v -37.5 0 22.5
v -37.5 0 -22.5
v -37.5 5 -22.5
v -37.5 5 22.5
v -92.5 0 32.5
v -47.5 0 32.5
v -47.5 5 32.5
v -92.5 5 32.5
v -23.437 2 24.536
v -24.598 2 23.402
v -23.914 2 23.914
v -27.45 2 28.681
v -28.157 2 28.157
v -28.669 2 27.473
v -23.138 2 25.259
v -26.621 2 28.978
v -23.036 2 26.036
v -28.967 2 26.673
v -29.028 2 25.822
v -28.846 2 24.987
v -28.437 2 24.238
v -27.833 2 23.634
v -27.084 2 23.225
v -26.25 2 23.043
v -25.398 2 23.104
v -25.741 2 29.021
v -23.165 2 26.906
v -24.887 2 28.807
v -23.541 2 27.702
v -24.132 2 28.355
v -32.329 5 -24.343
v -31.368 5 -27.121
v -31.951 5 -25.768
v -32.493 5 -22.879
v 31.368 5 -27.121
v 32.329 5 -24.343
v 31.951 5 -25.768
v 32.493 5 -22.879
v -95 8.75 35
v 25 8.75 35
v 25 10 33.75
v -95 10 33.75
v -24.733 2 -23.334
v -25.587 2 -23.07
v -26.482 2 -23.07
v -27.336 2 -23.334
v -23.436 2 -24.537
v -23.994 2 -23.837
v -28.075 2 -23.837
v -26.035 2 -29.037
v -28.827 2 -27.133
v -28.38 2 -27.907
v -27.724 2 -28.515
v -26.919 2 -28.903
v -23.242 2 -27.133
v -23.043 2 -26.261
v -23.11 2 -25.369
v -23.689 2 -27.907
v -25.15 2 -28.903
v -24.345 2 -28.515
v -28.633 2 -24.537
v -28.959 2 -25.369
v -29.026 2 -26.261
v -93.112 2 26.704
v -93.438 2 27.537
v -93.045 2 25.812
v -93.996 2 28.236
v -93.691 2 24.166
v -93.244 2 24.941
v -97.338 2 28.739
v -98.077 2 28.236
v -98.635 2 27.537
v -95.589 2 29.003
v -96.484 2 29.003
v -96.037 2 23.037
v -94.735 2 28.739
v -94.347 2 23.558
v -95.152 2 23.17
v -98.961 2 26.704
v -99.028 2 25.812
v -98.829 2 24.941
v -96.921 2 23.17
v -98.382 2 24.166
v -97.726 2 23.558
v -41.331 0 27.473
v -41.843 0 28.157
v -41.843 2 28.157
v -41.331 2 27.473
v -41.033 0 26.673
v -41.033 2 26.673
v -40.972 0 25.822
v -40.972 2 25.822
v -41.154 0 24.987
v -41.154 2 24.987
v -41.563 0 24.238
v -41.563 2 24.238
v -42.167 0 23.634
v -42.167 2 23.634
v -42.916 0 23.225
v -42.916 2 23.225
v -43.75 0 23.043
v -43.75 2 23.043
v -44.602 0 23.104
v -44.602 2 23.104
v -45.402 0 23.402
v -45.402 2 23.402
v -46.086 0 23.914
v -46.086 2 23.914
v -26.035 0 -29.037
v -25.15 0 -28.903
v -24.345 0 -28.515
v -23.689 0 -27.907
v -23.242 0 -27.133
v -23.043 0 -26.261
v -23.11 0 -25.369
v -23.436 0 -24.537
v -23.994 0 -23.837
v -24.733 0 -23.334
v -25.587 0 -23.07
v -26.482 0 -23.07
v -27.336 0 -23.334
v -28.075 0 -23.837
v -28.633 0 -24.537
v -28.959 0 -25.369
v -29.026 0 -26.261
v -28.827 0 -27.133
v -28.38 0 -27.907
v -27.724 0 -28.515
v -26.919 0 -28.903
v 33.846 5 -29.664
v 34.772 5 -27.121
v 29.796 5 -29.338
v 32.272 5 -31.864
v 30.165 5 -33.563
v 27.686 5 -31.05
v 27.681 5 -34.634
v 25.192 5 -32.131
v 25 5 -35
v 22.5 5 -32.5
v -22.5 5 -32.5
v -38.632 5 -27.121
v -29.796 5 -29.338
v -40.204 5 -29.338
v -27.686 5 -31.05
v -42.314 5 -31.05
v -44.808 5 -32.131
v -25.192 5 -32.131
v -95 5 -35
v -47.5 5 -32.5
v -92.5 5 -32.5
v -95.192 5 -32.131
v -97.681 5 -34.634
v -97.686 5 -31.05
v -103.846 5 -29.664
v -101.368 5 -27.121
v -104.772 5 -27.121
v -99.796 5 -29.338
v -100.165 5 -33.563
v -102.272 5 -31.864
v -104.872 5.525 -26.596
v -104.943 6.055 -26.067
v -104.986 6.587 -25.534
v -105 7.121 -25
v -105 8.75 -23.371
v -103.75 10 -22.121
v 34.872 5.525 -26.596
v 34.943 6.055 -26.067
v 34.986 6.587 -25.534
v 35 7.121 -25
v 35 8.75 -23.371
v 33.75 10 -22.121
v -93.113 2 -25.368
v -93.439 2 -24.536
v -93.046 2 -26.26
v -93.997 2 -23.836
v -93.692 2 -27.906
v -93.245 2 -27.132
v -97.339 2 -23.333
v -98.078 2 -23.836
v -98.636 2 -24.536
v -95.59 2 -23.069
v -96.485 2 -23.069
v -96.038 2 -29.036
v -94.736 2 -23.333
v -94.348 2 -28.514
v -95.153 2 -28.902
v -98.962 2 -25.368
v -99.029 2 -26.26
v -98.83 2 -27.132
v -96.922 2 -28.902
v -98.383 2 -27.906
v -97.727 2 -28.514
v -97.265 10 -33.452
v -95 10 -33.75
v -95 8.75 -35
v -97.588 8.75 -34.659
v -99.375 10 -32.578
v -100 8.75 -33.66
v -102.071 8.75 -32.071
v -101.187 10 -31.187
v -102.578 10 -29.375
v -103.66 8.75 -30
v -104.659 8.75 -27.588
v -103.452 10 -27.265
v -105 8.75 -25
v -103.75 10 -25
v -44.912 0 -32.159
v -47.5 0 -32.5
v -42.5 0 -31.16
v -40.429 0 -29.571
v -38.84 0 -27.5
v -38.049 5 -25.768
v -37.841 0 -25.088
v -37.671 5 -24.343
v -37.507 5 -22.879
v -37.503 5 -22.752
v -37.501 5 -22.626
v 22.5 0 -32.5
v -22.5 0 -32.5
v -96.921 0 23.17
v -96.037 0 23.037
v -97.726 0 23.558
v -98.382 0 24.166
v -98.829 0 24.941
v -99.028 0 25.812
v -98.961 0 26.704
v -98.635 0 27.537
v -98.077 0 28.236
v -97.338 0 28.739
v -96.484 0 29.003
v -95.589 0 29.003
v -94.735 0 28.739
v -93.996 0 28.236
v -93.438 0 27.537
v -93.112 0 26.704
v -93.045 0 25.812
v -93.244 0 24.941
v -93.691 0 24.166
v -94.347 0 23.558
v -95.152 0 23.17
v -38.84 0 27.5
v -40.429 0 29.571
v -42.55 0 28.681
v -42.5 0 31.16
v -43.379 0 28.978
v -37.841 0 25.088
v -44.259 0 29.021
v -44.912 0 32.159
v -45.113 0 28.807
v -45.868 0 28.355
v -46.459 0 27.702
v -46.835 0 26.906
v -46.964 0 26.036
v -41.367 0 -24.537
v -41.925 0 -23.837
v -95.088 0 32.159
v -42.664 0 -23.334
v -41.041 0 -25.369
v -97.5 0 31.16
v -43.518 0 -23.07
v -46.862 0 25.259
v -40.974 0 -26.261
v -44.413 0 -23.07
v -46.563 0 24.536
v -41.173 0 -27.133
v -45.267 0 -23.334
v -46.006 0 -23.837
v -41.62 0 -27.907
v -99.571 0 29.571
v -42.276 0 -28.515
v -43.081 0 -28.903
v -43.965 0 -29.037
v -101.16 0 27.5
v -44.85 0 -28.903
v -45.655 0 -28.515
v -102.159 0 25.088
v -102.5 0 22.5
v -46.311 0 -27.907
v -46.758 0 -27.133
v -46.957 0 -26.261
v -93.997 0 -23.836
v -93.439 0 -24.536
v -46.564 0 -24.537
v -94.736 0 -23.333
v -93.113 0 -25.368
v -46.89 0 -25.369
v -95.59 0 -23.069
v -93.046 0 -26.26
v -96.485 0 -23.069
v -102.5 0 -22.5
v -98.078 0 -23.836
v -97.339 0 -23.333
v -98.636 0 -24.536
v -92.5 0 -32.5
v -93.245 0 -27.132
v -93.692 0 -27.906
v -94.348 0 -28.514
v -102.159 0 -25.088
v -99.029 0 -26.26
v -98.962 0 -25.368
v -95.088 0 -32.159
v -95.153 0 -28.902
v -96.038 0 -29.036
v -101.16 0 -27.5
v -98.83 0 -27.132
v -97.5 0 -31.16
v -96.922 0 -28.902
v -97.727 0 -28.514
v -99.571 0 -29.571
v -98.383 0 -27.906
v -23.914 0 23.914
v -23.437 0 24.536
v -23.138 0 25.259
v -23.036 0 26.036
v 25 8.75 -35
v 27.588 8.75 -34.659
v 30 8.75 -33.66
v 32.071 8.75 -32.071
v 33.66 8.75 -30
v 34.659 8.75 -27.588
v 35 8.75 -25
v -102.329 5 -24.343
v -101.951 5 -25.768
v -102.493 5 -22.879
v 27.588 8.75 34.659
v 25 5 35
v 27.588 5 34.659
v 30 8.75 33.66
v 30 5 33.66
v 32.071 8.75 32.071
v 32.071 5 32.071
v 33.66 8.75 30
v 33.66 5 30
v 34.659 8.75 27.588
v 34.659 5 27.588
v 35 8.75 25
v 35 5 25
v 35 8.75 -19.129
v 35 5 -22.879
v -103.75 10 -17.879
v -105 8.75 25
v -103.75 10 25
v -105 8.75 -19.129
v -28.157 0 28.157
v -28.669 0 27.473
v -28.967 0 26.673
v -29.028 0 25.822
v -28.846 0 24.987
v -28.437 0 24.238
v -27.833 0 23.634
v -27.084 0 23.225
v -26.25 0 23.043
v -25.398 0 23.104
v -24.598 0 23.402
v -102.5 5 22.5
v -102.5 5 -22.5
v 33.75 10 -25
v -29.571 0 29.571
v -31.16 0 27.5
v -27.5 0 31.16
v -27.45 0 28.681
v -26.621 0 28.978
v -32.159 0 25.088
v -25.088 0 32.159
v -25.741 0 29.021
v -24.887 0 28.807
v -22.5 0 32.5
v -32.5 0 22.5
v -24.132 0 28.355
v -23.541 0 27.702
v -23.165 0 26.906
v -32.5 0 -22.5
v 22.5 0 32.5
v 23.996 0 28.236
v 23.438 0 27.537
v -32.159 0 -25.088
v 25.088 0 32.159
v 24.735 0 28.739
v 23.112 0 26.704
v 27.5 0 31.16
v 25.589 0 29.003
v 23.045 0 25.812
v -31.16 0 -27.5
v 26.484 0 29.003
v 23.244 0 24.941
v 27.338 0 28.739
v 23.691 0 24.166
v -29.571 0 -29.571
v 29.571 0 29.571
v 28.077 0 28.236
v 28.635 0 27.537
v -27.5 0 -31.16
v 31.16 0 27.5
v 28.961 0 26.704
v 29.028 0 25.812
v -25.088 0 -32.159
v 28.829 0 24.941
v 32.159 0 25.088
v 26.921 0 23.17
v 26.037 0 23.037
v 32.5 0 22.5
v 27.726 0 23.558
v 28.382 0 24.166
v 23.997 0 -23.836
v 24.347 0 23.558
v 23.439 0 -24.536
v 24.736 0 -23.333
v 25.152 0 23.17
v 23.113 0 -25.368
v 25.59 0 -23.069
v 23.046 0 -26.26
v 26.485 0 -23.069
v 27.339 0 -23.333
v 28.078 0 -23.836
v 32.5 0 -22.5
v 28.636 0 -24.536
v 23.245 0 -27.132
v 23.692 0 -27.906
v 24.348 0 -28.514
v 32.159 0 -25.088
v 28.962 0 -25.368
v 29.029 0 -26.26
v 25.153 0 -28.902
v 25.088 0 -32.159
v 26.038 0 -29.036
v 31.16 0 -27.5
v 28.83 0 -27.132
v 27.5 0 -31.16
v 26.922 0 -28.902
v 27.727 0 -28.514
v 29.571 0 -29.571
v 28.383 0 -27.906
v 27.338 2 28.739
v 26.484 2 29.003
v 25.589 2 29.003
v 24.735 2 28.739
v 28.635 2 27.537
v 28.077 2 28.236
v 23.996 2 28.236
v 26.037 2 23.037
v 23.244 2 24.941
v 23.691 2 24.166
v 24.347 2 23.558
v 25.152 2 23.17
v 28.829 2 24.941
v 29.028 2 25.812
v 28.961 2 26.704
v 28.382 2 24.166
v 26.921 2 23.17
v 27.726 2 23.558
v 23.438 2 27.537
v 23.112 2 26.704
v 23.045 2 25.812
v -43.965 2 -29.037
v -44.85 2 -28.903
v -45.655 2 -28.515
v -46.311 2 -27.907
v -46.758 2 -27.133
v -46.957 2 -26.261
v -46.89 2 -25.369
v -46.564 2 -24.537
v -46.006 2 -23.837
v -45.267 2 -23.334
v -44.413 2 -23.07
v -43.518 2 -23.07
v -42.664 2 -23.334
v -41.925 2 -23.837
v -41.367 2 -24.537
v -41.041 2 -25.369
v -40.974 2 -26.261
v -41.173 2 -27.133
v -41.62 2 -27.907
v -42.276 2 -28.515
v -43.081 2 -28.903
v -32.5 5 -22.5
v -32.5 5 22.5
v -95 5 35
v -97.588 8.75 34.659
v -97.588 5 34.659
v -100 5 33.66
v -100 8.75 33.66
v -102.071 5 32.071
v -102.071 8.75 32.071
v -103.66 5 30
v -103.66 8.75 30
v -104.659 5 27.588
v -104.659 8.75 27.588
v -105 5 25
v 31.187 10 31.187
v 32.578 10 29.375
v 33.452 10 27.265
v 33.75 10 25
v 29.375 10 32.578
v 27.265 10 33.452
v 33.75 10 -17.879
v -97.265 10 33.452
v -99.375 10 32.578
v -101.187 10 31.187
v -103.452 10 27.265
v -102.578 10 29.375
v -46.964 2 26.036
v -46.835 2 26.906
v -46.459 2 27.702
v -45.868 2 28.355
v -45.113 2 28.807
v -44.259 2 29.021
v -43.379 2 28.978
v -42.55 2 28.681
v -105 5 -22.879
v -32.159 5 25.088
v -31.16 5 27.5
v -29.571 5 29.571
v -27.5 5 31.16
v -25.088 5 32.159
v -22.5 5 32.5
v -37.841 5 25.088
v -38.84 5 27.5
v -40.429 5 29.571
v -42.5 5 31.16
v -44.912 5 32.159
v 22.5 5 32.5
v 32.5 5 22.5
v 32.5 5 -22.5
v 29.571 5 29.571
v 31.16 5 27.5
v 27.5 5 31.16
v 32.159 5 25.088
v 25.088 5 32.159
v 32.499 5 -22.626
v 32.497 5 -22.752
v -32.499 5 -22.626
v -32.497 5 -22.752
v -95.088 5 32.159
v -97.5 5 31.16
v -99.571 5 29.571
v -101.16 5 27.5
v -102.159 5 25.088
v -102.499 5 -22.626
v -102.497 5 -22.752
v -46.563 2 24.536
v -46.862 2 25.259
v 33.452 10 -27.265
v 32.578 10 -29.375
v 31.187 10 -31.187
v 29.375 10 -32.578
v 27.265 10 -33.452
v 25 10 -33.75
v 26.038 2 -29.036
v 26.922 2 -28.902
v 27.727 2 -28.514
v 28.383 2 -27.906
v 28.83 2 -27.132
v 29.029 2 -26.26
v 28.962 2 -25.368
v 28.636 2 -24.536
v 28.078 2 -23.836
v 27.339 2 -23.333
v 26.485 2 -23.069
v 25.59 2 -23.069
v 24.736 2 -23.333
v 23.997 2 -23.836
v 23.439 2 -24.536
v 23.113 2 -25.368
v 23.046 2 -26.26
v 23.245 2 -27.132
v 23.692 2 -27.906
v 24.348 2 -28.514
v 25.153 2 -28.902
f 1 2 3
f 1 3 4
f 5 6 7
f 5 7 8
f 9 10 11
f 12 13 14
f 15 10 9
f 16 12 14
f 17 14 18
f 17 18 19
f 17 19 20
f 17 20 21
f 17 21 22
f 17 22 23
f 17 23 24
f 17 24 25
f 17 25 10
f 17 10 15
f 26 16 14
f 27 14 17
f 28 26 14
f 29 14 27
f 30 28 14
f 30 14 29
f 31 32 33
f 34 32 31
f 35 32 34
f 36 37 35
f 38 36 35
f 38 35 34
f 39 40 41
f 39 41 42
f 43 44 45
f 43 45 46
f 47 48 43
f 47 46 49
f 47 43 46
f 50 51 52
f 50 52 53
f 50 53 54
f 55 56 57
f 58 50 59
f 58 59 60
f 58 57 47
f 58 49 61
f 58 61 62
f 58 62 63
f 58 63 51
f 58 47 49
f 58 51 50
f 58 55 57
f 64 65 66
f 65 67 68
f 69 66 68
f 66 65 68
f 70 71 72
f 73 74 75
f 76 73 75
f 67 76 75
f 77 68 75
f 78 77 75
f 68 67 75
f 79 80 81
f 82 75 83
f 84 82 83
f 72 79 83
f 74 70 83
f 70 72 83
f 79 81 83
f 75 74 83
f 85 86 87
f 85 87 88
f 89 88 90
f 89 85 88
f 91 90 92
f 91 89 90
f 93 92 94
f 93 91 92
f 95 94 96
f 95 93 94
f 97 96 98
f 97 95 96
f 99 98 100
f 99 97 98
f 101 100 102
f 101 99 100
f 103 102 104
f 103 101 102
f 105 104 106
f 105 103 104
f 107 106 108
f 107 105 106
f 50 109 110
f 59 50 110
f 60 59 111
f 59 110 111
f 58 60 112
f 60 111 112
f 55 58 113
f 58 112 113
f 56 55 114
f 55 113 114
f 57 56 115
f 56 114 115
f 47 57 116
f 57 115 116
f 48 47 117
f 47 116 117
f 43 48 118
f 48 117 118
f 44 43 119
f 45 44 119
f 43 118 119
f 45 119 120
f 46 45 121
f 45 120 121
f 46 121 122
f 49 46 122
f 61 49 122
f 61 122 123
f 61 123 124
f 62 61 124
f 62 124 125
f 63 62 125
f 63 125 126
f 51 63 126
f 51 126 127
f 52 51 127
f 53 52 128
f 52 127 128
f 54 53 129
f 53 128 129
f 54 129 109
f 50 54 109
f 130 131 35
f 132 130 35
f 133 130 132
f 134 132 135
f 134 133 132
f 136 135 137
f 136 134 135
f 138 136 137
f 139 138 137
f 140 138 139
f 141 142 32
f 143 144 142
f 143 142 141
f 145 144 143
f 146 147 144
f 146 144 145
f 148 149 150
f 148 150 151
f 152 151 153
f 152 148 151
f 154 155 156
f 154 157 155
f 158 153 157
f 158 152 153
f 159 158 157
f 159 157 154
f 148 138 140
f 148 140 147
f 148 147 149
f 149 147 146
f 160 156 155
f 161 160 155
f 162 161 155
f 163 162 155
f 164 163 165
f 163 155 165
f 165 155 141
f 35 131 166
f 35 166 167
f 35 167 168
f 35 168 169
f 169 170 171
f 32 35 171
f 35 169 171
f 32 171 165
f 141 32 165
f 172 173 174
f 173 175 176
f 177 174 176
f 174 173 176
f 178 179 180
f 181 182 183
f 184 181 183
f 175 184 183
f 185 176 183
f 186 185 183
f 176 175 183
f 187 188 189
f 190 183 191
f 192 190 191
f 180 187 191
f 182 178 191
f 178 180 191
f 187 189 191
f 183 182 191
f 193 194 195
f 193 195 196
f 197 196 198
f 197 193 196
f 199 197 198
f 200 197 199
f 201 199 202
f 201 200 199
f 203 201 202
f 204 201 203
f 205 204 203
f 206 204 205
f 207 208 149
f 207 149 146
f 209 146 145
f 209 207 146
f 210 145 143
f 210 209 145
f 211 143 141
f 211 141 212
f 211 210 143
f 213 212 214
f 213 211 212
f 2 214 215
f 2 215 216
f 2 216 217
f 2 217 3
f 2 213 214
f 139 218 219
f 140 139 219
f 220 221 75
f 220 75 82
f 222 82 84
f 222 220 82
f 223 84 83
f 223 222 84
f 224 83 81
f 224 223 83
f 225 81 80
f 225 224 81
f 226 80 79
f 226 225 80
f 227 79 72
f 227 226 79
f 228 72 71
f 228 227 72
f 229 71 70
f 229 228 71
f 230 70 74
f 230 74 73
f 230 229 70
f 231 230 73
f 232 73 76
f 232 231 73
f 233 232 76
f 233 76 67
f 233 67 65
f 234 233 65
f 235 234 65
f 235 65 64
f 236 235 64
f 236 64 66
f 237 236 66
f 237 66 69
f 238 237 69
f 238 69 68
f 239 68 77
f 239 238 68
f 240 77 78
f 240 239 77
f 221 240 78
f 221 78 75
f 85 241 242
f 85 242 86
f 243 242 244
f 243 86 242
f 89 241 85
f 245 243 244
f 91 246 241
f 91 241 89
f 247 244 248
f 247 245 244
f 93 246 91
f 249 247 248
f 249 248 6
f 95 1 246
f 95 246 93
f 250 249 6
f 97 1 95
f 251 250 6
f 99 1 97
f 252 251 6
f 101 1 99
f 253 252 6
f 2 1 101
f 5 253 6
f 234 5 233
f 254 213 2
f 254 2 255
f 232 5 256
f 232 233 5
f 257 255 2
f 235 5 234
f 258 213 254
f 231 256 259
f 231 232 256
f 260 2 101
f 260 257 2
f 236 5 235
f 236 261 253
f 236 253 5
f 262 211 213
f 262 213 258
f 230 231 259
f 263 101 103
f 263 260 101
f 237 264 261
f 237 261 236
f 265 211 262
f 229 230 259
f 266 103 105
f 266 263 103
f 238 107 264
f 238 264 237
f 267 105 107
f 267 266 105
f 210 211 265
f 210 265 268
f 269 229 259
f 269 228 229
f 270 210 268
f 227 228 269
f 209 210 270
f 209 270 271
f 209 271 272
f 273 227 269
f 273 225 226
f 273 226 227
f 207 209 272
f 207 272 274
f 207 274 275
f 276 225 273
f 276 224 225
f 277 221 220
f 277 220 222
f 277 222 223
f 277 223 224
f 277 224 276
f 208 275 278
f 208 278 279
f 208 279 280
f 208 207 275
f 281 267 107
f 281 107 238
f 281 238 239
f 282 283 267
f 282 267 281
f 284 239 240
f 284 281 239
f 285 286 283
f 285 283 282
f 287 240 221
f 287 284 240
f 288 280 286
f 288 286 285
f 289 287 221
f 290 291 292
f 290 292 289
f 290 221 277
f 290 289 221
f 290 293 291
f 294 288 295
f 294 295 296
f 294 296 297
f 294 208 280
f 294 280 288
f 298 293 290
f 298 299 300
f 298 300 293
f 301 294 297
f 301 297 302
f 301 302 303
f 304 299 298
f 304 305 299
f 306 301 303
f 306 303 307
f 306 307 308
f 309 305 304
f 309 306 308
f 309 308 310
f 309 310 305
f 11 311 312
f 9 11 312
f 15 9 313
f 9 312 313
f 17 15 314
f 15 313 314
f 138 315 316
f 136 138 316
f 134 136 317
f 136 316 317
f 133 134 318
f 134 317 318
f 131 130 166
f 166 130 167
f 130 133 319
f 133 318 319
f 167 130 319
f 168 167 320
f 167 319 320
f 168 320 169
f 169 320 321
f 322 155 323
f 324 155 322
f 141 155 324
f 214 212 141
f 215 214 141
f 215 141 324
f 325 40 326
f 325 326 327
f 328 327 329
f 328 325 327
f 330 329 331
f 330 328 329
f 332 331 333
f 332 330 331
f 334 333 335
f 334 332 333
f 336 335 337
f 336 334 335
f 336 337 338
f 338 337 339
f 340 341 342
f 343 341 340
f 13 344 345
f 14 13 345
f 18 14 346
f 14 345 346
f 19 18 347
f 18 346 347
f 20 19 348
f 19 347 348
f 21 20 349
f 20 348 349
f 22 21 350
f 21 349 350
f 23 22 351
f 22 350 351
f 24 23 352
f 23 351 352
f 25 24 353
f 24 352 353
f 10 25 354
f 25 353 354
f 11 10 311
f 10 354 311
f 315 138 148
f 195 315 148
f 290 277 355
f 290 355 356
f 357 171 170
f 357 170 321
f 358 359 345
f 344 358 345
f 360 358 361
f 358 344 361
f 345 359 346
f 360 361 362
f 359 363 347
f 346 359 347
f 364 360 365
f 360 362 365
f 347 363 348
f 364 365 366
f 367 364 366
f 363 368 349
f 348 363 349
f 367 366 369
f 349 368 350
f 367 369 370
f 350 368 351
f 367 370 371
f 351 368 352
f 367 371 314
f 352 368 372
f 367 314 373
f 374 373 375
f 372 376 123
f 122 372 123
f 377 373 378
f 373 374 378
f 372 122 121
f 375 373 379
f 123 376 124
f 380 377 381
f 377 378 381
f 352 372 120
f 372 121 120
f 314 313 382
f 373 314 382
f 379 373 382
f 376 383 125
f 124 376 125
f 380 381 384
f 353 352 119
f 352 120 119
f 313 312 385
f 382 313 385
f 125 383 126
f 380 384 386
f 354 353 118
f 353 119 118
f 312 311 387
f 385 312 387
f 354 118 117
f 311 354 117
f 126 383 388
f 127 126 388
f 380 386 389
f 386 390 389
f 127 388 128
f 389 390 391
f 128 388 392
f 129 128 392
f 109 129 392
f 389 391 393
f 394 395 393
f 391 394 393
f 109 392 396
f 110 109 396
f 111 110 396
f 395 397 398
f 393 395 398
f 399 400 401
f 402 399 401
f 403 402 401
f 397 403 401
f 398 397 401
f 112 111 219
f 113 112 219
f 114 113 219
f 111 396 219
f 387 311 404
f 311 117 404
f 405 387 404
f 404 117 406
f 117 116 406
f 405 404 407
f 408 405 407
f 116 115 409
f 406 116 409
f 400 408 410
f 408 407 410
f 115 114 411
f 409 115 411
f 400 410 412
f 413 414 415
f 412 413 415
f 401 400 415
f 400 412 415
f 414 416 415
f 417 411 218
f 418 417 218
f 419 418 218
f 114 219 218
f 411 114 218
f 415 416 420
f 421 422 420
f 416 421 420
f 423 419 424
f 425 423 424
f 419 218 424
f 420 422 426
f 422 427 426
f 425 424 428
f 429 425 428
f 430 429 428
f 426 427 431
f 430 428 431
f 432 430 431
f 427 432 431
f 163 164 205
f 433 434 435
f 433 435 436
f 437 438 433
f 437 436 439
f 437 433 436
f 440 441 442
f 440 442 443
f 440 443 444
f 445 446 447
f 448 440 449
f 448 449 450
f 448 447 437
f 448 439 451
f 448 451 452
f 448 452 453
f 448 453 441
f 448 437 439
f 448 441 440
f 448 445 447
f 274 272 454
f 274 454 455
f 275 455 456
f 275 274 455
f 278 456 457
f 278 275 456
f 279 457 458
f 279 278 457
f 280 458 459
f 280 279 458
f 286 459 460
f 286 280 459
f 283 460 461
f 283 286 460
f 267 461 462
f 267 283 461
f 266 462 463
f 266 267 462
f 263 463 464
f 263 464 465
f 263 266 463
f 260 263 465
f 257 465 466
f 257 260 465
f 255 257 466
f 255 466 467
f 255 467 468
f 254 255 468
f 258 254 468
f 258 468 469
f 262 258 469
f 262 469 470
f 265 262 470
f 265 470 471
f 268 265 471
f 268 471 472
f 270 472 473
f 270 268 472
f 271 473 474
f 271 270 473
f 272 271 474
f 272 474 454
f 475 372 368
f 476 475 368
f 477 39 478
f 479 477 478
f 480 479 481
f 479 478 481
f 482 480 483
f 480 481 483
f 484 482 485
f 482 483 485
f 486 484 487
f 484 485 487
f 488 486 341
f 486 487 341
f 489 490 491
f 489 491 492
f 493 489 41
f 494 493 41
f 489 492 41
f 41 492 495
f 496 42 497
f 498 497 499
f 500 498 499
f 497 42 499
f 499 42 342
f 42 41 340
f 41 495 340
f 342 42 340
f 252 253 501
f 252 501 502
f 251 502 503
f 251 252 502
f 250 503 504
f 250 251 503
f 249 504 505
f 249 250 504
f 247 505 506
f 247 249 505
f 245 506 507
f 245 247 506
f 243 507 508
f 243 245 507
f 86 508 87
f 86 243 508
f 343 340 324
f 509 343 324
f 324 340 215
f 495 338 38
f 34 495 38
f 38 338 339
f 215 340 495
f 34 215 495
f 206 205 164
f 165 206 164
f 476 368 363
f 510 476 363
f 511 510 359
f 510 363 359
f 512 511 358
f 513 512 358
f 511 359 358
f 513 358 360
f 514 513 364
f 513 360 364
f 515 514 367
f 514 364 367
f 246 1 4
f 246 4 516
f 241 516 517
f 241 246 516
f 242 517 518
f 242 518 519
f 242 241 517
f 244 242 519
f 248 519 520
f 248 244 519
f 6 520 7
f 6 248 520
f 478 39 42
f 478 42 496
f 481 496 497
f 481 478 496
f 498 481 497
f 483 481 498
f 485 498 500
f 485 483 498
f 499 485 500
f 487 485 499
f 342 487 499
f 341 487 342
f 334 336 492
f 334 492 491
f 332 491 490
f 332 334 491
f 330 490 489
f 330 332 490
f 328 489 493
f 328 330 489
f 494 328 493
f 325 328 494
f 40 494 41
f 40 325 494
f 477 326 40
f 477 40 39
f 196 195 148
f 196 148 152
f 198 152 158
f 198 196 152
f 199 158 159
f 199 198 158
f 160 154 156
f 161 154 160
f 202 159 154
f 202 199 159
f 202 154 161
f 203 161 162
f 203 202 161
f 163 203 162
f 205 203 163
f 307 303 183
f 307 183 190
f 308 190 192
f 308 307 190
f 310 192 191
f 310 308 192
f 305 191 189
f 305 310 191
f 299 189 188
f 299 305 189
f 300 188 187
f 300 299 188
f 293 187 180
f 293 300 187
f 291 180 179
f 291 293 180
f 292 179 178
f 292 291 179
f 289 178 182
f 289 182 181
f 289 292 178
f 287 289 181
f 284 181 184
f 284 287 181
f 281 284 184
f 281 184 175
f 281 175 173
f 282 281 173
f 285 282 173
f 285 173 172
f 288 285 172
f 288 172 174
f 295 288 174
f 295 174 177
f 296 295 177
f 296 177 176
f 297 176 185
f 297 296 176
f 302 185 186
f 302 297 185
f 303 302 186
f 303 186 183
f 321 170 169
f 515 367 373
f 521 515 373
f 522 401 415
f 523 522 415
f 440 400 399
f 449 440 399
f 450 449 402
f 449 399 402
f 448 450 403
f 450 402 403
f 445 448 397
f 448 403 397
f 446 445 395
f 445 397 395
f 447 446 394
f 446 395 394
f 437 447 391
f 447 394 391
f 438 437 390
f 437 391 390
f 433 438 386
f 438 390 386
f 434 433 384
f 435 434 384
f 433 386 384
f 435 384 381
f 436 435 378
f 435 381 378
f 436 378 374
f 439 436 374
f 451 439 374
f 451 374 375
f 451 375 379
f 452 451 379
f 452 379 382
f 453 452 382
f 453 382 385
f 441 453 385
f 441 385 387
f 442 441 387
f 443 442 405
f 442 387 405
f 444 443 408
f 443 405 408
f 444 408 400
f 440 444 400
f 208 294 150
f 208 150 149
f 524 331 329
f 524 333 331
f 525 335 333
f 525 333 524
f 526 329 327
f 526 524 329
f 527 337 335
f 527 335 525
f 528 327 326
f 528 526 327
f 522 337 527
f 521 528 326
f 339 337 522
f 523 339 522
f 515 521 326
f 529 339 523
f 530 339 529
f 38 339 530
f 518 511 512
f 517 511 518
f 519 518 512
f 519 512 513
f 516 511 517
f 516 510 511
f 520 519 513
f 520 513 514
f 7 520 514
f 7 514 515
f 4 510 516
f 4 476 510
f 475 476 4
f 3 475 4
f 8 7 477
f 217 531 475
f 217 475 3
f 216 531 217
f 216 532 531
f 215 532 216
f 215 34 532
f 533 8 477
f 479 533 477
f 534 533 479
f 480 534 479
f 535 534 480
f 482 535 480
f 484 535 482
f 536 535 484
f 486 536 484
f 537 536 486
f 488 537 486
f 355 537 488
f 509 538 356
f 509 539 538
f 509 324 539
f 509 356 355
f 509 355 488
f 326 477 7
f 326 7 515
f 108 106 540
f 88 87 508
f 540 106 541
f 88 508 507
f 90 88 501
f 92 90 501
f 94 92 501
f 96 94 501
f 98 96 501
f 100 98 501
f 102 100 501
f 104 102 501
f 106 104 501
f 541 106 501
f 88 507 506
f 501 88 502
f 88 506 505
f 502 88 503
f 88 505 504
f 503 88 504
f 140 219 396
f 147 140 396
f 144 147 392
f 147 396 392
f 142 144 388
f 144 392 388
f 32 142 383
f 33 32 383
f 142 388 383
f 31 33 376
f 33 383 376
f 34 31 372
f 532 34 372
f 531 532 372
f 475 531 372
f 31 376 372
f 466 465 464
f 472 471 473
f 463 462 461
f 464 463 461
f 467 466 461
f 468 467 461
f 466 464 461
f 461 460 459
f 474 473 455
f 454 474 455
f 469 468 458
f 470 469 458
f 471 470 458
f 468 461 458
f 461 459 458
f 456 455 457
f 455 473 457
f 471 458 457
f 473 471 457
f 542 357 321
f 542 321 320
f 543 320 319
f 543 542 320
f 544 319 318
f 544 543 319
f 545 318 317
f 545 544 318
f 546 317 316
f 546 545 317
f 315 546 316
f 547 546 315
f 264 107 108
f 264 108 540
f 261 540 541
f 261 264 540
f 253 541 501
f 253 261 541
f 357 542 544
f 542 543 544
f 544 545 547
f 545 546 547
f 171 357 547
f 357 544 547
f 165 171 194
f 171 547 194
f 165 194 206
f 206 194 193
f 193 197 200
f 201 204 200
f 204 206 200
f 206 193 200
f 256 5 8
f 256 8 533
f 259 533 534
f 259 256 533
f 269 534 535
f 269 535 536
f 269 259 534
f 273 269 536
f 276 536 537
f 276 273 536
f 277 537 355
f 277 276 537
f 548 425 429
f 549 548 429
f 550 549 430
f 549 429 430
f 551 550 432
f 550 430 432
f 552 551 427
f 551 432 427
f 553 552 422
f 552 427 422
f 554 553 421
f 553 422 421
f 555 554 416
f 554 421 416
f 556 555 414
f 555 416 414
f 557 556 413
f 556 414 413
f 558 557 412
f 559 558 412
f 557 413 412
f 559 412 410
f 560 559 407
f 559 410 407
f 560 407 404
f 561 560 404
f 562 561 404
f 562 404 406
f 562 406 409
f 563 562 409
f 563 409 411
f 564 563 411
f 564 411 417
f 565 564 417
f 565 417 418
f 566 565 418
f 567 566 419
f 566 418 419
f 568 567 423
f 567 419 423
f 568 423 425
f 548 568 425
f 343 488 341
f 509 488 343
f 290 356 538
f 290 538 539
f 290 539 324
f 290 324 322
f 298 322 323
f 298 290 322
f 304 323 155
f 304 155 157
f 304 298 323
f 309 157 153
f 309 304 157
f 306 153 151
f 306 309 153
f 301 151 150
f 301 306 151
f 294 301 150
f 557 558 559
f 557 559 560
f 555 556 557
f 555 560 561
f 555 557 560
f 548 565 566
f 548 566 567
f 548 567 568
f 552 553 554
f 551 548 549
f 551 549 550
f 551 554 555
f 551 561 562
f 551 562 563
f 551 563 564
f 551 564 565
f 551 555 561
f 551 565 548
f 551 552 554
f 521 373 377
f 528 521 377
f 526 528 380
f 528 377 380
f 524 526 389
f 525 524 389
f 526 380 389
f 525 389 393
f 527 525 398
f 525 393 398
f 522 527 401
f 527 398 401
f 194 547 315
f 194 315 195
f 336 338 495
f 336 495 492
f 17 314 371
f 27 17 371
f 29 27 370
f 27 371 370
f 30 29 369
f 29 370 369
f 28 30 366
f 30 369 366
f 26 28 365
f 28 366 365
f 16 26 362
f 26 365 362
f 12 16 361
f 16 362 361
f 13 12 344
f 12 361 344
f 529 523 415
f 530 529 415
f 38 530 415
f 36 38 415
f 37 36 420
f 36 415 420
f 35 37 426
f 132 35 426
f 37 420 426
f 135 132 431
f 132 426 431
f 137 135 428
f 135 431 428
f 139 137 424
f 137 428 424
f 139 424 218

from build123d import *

# Parameters (mm, degrees)
BOSS_EXTRUDE4_DEPTH = 5
SKETCH6_W           = 70
SKETCH6_H           = 70
BOSS_EXTRUDE5_DEPTH = 5
SKETCH8_R           = 3
CUT_EXTRUDE1_DEPTH  = 2
FILLET1_R           = 10
CUT_EXTRUDE2_DEPTH  = 145.654761415
CHAMFER1_SIZE       = 1.25


with BuildPart() as part:
    # Sketch5 → Boss-Extrude4 (new body)
    with BuildSketch(Plane(origin=(0, 0, 0), x_dir=(1, 0, 0), z_dir=(0, 1, 0))):
        with BuildLine():
            Line((-22.5, -32.5), (22.5, -32.5))
            ThreePointArc((22.5, -32.5), (29.571067812, -29.571067812), (32.5, -22.5))
            Line((32.5, -22.5), (32.5, 22.5))
            ThreePointArc((32.5, 22.5), (29.571067812, 29.571067812), (22.5, 32.5))
            Line((22.5, 32.5), (-22.5, 32.5))
            ThreePointArc((-22.5, 32.5), (-29.571067812, 29.571067812), (-32.5, 22.5))
            Line((-32.5, 22.5), (-32.5, -22.5))
            ThreePointArc((-32.5, -22.5), (-29.571067812, -29.571067812), (-22.5, -32.5))
        make_face()
    extrude(amount=BOSS_EXTRUDE4_DEPTH)

    # Sketch6 → Boss-Extrude5 (add)
    with BuildSketch(Plane(origin=(0, 5, 0), x_dir=(1, 0, 0), z_dir=(0, 1, 0))):
        Rectangle(SKETCH6_W, SKETCH6_H)
    extrude(amount=BOSS_EXTRUDE5_DEPTH)

    # Sketch8 → Cut-Extrude1 (cut)
    with BuildSketch(Plane.XZ):
        with Locations(Location((26.037533906, -26.035533906, 0), (0, 0, 270))):
            Circle(SKETCH8_R)
        with Locations(Location((26.036533906, 26.036533906, 0), (0, 0, 270))):
            Circle(SKETCH8_R)
        with BuildLine():
            ThreePointArc((-23.035533906, 26.035533906), (-24.887483609, 28.807172503), (-28.156854249, 28.156854249))
            Line((-28.156854249, 28.156854249), (-23.914213562, 23.914213562))
            ThreePointArc((-23.914213562, 23.914213562), (-23.263895308, 24.887483609), (-23.035533906, 26.035533906))
        make_face()
        with BuildLine():
            Line((-23.914213562, 23.914213562), (-28.156854249, 28.156854249))
            ThreePointArc((-28.156854249, 28.156854249), (-28.156854249, 23.914213562), (-23.914213562, 23.914213562))
        make_face()
        with Locations(Location((-26.034533906, -26.036533906, 0), (0, 0, 270))):
            Circle(SKETCH8_R)
    extrude(amount=-CUT_EXTRUDE1_DEPTH, mode=Mode.SUBTRACT)

    # Mirror1: part across plane


with BuildPart() as part_1:
    add(part.part)
    add(part.part.mirror(Plane(origin=(-35, 10, -35), x_dir=(0, 0, 1), z_dir=(1, 0, 0))))

    # Fillet1
    fillet1_edges = [part_1.edges().sort_by_distance(p)[0] for p in [
        (35, 7.5, 35),
        (35, 7.5, -35),
        (-105, 7.5, 35),
        (-105, 7.5, -35),
    ]]
    fillet(fillet1_edges, radius=FILLET1_R)

    # Sketch9 → Cut-Extrude2 (cut, through all)
    with BuildSketch(Plane(origin=(35, 0, 0), x_dir=(0, 0, -1), z_dir=(1, 0, 0))):
        Polygon((17.878679656, 10), (22.121320344, 10), (26.060660172, 6.060660172), (27.121320344, 5), (22.878679656, 5), (18.939339828, 8.939339828), align=None)
    extrude(amount=-CUT_EXTRUDE2_DEPTH, mode=Mode.SUBTRACT)

    # Chamfer1
    chamfer1_edges = [part_1.edges().sort_by_distance(p)[0] for p in [
        (-105, 10, 3.560660172),
        (-35, 10, -35),
        (-35, 10, 35),
        (35, 10, 3.560660172),
        (32.071067812, 10, -32.071067812),
        (32.071067812, 10, 32.071067812),
        (-102.071067812, 10, 32.071067812),
        (-102.071067812, 10, -32.071067812),
        (-105, 10, -23.560660172),
        (35, 10, -23.560660172),
    ]]
    chamfer(chamfer1_edges, length=CHAMFER1_SIZE)


solid = part_1.part
